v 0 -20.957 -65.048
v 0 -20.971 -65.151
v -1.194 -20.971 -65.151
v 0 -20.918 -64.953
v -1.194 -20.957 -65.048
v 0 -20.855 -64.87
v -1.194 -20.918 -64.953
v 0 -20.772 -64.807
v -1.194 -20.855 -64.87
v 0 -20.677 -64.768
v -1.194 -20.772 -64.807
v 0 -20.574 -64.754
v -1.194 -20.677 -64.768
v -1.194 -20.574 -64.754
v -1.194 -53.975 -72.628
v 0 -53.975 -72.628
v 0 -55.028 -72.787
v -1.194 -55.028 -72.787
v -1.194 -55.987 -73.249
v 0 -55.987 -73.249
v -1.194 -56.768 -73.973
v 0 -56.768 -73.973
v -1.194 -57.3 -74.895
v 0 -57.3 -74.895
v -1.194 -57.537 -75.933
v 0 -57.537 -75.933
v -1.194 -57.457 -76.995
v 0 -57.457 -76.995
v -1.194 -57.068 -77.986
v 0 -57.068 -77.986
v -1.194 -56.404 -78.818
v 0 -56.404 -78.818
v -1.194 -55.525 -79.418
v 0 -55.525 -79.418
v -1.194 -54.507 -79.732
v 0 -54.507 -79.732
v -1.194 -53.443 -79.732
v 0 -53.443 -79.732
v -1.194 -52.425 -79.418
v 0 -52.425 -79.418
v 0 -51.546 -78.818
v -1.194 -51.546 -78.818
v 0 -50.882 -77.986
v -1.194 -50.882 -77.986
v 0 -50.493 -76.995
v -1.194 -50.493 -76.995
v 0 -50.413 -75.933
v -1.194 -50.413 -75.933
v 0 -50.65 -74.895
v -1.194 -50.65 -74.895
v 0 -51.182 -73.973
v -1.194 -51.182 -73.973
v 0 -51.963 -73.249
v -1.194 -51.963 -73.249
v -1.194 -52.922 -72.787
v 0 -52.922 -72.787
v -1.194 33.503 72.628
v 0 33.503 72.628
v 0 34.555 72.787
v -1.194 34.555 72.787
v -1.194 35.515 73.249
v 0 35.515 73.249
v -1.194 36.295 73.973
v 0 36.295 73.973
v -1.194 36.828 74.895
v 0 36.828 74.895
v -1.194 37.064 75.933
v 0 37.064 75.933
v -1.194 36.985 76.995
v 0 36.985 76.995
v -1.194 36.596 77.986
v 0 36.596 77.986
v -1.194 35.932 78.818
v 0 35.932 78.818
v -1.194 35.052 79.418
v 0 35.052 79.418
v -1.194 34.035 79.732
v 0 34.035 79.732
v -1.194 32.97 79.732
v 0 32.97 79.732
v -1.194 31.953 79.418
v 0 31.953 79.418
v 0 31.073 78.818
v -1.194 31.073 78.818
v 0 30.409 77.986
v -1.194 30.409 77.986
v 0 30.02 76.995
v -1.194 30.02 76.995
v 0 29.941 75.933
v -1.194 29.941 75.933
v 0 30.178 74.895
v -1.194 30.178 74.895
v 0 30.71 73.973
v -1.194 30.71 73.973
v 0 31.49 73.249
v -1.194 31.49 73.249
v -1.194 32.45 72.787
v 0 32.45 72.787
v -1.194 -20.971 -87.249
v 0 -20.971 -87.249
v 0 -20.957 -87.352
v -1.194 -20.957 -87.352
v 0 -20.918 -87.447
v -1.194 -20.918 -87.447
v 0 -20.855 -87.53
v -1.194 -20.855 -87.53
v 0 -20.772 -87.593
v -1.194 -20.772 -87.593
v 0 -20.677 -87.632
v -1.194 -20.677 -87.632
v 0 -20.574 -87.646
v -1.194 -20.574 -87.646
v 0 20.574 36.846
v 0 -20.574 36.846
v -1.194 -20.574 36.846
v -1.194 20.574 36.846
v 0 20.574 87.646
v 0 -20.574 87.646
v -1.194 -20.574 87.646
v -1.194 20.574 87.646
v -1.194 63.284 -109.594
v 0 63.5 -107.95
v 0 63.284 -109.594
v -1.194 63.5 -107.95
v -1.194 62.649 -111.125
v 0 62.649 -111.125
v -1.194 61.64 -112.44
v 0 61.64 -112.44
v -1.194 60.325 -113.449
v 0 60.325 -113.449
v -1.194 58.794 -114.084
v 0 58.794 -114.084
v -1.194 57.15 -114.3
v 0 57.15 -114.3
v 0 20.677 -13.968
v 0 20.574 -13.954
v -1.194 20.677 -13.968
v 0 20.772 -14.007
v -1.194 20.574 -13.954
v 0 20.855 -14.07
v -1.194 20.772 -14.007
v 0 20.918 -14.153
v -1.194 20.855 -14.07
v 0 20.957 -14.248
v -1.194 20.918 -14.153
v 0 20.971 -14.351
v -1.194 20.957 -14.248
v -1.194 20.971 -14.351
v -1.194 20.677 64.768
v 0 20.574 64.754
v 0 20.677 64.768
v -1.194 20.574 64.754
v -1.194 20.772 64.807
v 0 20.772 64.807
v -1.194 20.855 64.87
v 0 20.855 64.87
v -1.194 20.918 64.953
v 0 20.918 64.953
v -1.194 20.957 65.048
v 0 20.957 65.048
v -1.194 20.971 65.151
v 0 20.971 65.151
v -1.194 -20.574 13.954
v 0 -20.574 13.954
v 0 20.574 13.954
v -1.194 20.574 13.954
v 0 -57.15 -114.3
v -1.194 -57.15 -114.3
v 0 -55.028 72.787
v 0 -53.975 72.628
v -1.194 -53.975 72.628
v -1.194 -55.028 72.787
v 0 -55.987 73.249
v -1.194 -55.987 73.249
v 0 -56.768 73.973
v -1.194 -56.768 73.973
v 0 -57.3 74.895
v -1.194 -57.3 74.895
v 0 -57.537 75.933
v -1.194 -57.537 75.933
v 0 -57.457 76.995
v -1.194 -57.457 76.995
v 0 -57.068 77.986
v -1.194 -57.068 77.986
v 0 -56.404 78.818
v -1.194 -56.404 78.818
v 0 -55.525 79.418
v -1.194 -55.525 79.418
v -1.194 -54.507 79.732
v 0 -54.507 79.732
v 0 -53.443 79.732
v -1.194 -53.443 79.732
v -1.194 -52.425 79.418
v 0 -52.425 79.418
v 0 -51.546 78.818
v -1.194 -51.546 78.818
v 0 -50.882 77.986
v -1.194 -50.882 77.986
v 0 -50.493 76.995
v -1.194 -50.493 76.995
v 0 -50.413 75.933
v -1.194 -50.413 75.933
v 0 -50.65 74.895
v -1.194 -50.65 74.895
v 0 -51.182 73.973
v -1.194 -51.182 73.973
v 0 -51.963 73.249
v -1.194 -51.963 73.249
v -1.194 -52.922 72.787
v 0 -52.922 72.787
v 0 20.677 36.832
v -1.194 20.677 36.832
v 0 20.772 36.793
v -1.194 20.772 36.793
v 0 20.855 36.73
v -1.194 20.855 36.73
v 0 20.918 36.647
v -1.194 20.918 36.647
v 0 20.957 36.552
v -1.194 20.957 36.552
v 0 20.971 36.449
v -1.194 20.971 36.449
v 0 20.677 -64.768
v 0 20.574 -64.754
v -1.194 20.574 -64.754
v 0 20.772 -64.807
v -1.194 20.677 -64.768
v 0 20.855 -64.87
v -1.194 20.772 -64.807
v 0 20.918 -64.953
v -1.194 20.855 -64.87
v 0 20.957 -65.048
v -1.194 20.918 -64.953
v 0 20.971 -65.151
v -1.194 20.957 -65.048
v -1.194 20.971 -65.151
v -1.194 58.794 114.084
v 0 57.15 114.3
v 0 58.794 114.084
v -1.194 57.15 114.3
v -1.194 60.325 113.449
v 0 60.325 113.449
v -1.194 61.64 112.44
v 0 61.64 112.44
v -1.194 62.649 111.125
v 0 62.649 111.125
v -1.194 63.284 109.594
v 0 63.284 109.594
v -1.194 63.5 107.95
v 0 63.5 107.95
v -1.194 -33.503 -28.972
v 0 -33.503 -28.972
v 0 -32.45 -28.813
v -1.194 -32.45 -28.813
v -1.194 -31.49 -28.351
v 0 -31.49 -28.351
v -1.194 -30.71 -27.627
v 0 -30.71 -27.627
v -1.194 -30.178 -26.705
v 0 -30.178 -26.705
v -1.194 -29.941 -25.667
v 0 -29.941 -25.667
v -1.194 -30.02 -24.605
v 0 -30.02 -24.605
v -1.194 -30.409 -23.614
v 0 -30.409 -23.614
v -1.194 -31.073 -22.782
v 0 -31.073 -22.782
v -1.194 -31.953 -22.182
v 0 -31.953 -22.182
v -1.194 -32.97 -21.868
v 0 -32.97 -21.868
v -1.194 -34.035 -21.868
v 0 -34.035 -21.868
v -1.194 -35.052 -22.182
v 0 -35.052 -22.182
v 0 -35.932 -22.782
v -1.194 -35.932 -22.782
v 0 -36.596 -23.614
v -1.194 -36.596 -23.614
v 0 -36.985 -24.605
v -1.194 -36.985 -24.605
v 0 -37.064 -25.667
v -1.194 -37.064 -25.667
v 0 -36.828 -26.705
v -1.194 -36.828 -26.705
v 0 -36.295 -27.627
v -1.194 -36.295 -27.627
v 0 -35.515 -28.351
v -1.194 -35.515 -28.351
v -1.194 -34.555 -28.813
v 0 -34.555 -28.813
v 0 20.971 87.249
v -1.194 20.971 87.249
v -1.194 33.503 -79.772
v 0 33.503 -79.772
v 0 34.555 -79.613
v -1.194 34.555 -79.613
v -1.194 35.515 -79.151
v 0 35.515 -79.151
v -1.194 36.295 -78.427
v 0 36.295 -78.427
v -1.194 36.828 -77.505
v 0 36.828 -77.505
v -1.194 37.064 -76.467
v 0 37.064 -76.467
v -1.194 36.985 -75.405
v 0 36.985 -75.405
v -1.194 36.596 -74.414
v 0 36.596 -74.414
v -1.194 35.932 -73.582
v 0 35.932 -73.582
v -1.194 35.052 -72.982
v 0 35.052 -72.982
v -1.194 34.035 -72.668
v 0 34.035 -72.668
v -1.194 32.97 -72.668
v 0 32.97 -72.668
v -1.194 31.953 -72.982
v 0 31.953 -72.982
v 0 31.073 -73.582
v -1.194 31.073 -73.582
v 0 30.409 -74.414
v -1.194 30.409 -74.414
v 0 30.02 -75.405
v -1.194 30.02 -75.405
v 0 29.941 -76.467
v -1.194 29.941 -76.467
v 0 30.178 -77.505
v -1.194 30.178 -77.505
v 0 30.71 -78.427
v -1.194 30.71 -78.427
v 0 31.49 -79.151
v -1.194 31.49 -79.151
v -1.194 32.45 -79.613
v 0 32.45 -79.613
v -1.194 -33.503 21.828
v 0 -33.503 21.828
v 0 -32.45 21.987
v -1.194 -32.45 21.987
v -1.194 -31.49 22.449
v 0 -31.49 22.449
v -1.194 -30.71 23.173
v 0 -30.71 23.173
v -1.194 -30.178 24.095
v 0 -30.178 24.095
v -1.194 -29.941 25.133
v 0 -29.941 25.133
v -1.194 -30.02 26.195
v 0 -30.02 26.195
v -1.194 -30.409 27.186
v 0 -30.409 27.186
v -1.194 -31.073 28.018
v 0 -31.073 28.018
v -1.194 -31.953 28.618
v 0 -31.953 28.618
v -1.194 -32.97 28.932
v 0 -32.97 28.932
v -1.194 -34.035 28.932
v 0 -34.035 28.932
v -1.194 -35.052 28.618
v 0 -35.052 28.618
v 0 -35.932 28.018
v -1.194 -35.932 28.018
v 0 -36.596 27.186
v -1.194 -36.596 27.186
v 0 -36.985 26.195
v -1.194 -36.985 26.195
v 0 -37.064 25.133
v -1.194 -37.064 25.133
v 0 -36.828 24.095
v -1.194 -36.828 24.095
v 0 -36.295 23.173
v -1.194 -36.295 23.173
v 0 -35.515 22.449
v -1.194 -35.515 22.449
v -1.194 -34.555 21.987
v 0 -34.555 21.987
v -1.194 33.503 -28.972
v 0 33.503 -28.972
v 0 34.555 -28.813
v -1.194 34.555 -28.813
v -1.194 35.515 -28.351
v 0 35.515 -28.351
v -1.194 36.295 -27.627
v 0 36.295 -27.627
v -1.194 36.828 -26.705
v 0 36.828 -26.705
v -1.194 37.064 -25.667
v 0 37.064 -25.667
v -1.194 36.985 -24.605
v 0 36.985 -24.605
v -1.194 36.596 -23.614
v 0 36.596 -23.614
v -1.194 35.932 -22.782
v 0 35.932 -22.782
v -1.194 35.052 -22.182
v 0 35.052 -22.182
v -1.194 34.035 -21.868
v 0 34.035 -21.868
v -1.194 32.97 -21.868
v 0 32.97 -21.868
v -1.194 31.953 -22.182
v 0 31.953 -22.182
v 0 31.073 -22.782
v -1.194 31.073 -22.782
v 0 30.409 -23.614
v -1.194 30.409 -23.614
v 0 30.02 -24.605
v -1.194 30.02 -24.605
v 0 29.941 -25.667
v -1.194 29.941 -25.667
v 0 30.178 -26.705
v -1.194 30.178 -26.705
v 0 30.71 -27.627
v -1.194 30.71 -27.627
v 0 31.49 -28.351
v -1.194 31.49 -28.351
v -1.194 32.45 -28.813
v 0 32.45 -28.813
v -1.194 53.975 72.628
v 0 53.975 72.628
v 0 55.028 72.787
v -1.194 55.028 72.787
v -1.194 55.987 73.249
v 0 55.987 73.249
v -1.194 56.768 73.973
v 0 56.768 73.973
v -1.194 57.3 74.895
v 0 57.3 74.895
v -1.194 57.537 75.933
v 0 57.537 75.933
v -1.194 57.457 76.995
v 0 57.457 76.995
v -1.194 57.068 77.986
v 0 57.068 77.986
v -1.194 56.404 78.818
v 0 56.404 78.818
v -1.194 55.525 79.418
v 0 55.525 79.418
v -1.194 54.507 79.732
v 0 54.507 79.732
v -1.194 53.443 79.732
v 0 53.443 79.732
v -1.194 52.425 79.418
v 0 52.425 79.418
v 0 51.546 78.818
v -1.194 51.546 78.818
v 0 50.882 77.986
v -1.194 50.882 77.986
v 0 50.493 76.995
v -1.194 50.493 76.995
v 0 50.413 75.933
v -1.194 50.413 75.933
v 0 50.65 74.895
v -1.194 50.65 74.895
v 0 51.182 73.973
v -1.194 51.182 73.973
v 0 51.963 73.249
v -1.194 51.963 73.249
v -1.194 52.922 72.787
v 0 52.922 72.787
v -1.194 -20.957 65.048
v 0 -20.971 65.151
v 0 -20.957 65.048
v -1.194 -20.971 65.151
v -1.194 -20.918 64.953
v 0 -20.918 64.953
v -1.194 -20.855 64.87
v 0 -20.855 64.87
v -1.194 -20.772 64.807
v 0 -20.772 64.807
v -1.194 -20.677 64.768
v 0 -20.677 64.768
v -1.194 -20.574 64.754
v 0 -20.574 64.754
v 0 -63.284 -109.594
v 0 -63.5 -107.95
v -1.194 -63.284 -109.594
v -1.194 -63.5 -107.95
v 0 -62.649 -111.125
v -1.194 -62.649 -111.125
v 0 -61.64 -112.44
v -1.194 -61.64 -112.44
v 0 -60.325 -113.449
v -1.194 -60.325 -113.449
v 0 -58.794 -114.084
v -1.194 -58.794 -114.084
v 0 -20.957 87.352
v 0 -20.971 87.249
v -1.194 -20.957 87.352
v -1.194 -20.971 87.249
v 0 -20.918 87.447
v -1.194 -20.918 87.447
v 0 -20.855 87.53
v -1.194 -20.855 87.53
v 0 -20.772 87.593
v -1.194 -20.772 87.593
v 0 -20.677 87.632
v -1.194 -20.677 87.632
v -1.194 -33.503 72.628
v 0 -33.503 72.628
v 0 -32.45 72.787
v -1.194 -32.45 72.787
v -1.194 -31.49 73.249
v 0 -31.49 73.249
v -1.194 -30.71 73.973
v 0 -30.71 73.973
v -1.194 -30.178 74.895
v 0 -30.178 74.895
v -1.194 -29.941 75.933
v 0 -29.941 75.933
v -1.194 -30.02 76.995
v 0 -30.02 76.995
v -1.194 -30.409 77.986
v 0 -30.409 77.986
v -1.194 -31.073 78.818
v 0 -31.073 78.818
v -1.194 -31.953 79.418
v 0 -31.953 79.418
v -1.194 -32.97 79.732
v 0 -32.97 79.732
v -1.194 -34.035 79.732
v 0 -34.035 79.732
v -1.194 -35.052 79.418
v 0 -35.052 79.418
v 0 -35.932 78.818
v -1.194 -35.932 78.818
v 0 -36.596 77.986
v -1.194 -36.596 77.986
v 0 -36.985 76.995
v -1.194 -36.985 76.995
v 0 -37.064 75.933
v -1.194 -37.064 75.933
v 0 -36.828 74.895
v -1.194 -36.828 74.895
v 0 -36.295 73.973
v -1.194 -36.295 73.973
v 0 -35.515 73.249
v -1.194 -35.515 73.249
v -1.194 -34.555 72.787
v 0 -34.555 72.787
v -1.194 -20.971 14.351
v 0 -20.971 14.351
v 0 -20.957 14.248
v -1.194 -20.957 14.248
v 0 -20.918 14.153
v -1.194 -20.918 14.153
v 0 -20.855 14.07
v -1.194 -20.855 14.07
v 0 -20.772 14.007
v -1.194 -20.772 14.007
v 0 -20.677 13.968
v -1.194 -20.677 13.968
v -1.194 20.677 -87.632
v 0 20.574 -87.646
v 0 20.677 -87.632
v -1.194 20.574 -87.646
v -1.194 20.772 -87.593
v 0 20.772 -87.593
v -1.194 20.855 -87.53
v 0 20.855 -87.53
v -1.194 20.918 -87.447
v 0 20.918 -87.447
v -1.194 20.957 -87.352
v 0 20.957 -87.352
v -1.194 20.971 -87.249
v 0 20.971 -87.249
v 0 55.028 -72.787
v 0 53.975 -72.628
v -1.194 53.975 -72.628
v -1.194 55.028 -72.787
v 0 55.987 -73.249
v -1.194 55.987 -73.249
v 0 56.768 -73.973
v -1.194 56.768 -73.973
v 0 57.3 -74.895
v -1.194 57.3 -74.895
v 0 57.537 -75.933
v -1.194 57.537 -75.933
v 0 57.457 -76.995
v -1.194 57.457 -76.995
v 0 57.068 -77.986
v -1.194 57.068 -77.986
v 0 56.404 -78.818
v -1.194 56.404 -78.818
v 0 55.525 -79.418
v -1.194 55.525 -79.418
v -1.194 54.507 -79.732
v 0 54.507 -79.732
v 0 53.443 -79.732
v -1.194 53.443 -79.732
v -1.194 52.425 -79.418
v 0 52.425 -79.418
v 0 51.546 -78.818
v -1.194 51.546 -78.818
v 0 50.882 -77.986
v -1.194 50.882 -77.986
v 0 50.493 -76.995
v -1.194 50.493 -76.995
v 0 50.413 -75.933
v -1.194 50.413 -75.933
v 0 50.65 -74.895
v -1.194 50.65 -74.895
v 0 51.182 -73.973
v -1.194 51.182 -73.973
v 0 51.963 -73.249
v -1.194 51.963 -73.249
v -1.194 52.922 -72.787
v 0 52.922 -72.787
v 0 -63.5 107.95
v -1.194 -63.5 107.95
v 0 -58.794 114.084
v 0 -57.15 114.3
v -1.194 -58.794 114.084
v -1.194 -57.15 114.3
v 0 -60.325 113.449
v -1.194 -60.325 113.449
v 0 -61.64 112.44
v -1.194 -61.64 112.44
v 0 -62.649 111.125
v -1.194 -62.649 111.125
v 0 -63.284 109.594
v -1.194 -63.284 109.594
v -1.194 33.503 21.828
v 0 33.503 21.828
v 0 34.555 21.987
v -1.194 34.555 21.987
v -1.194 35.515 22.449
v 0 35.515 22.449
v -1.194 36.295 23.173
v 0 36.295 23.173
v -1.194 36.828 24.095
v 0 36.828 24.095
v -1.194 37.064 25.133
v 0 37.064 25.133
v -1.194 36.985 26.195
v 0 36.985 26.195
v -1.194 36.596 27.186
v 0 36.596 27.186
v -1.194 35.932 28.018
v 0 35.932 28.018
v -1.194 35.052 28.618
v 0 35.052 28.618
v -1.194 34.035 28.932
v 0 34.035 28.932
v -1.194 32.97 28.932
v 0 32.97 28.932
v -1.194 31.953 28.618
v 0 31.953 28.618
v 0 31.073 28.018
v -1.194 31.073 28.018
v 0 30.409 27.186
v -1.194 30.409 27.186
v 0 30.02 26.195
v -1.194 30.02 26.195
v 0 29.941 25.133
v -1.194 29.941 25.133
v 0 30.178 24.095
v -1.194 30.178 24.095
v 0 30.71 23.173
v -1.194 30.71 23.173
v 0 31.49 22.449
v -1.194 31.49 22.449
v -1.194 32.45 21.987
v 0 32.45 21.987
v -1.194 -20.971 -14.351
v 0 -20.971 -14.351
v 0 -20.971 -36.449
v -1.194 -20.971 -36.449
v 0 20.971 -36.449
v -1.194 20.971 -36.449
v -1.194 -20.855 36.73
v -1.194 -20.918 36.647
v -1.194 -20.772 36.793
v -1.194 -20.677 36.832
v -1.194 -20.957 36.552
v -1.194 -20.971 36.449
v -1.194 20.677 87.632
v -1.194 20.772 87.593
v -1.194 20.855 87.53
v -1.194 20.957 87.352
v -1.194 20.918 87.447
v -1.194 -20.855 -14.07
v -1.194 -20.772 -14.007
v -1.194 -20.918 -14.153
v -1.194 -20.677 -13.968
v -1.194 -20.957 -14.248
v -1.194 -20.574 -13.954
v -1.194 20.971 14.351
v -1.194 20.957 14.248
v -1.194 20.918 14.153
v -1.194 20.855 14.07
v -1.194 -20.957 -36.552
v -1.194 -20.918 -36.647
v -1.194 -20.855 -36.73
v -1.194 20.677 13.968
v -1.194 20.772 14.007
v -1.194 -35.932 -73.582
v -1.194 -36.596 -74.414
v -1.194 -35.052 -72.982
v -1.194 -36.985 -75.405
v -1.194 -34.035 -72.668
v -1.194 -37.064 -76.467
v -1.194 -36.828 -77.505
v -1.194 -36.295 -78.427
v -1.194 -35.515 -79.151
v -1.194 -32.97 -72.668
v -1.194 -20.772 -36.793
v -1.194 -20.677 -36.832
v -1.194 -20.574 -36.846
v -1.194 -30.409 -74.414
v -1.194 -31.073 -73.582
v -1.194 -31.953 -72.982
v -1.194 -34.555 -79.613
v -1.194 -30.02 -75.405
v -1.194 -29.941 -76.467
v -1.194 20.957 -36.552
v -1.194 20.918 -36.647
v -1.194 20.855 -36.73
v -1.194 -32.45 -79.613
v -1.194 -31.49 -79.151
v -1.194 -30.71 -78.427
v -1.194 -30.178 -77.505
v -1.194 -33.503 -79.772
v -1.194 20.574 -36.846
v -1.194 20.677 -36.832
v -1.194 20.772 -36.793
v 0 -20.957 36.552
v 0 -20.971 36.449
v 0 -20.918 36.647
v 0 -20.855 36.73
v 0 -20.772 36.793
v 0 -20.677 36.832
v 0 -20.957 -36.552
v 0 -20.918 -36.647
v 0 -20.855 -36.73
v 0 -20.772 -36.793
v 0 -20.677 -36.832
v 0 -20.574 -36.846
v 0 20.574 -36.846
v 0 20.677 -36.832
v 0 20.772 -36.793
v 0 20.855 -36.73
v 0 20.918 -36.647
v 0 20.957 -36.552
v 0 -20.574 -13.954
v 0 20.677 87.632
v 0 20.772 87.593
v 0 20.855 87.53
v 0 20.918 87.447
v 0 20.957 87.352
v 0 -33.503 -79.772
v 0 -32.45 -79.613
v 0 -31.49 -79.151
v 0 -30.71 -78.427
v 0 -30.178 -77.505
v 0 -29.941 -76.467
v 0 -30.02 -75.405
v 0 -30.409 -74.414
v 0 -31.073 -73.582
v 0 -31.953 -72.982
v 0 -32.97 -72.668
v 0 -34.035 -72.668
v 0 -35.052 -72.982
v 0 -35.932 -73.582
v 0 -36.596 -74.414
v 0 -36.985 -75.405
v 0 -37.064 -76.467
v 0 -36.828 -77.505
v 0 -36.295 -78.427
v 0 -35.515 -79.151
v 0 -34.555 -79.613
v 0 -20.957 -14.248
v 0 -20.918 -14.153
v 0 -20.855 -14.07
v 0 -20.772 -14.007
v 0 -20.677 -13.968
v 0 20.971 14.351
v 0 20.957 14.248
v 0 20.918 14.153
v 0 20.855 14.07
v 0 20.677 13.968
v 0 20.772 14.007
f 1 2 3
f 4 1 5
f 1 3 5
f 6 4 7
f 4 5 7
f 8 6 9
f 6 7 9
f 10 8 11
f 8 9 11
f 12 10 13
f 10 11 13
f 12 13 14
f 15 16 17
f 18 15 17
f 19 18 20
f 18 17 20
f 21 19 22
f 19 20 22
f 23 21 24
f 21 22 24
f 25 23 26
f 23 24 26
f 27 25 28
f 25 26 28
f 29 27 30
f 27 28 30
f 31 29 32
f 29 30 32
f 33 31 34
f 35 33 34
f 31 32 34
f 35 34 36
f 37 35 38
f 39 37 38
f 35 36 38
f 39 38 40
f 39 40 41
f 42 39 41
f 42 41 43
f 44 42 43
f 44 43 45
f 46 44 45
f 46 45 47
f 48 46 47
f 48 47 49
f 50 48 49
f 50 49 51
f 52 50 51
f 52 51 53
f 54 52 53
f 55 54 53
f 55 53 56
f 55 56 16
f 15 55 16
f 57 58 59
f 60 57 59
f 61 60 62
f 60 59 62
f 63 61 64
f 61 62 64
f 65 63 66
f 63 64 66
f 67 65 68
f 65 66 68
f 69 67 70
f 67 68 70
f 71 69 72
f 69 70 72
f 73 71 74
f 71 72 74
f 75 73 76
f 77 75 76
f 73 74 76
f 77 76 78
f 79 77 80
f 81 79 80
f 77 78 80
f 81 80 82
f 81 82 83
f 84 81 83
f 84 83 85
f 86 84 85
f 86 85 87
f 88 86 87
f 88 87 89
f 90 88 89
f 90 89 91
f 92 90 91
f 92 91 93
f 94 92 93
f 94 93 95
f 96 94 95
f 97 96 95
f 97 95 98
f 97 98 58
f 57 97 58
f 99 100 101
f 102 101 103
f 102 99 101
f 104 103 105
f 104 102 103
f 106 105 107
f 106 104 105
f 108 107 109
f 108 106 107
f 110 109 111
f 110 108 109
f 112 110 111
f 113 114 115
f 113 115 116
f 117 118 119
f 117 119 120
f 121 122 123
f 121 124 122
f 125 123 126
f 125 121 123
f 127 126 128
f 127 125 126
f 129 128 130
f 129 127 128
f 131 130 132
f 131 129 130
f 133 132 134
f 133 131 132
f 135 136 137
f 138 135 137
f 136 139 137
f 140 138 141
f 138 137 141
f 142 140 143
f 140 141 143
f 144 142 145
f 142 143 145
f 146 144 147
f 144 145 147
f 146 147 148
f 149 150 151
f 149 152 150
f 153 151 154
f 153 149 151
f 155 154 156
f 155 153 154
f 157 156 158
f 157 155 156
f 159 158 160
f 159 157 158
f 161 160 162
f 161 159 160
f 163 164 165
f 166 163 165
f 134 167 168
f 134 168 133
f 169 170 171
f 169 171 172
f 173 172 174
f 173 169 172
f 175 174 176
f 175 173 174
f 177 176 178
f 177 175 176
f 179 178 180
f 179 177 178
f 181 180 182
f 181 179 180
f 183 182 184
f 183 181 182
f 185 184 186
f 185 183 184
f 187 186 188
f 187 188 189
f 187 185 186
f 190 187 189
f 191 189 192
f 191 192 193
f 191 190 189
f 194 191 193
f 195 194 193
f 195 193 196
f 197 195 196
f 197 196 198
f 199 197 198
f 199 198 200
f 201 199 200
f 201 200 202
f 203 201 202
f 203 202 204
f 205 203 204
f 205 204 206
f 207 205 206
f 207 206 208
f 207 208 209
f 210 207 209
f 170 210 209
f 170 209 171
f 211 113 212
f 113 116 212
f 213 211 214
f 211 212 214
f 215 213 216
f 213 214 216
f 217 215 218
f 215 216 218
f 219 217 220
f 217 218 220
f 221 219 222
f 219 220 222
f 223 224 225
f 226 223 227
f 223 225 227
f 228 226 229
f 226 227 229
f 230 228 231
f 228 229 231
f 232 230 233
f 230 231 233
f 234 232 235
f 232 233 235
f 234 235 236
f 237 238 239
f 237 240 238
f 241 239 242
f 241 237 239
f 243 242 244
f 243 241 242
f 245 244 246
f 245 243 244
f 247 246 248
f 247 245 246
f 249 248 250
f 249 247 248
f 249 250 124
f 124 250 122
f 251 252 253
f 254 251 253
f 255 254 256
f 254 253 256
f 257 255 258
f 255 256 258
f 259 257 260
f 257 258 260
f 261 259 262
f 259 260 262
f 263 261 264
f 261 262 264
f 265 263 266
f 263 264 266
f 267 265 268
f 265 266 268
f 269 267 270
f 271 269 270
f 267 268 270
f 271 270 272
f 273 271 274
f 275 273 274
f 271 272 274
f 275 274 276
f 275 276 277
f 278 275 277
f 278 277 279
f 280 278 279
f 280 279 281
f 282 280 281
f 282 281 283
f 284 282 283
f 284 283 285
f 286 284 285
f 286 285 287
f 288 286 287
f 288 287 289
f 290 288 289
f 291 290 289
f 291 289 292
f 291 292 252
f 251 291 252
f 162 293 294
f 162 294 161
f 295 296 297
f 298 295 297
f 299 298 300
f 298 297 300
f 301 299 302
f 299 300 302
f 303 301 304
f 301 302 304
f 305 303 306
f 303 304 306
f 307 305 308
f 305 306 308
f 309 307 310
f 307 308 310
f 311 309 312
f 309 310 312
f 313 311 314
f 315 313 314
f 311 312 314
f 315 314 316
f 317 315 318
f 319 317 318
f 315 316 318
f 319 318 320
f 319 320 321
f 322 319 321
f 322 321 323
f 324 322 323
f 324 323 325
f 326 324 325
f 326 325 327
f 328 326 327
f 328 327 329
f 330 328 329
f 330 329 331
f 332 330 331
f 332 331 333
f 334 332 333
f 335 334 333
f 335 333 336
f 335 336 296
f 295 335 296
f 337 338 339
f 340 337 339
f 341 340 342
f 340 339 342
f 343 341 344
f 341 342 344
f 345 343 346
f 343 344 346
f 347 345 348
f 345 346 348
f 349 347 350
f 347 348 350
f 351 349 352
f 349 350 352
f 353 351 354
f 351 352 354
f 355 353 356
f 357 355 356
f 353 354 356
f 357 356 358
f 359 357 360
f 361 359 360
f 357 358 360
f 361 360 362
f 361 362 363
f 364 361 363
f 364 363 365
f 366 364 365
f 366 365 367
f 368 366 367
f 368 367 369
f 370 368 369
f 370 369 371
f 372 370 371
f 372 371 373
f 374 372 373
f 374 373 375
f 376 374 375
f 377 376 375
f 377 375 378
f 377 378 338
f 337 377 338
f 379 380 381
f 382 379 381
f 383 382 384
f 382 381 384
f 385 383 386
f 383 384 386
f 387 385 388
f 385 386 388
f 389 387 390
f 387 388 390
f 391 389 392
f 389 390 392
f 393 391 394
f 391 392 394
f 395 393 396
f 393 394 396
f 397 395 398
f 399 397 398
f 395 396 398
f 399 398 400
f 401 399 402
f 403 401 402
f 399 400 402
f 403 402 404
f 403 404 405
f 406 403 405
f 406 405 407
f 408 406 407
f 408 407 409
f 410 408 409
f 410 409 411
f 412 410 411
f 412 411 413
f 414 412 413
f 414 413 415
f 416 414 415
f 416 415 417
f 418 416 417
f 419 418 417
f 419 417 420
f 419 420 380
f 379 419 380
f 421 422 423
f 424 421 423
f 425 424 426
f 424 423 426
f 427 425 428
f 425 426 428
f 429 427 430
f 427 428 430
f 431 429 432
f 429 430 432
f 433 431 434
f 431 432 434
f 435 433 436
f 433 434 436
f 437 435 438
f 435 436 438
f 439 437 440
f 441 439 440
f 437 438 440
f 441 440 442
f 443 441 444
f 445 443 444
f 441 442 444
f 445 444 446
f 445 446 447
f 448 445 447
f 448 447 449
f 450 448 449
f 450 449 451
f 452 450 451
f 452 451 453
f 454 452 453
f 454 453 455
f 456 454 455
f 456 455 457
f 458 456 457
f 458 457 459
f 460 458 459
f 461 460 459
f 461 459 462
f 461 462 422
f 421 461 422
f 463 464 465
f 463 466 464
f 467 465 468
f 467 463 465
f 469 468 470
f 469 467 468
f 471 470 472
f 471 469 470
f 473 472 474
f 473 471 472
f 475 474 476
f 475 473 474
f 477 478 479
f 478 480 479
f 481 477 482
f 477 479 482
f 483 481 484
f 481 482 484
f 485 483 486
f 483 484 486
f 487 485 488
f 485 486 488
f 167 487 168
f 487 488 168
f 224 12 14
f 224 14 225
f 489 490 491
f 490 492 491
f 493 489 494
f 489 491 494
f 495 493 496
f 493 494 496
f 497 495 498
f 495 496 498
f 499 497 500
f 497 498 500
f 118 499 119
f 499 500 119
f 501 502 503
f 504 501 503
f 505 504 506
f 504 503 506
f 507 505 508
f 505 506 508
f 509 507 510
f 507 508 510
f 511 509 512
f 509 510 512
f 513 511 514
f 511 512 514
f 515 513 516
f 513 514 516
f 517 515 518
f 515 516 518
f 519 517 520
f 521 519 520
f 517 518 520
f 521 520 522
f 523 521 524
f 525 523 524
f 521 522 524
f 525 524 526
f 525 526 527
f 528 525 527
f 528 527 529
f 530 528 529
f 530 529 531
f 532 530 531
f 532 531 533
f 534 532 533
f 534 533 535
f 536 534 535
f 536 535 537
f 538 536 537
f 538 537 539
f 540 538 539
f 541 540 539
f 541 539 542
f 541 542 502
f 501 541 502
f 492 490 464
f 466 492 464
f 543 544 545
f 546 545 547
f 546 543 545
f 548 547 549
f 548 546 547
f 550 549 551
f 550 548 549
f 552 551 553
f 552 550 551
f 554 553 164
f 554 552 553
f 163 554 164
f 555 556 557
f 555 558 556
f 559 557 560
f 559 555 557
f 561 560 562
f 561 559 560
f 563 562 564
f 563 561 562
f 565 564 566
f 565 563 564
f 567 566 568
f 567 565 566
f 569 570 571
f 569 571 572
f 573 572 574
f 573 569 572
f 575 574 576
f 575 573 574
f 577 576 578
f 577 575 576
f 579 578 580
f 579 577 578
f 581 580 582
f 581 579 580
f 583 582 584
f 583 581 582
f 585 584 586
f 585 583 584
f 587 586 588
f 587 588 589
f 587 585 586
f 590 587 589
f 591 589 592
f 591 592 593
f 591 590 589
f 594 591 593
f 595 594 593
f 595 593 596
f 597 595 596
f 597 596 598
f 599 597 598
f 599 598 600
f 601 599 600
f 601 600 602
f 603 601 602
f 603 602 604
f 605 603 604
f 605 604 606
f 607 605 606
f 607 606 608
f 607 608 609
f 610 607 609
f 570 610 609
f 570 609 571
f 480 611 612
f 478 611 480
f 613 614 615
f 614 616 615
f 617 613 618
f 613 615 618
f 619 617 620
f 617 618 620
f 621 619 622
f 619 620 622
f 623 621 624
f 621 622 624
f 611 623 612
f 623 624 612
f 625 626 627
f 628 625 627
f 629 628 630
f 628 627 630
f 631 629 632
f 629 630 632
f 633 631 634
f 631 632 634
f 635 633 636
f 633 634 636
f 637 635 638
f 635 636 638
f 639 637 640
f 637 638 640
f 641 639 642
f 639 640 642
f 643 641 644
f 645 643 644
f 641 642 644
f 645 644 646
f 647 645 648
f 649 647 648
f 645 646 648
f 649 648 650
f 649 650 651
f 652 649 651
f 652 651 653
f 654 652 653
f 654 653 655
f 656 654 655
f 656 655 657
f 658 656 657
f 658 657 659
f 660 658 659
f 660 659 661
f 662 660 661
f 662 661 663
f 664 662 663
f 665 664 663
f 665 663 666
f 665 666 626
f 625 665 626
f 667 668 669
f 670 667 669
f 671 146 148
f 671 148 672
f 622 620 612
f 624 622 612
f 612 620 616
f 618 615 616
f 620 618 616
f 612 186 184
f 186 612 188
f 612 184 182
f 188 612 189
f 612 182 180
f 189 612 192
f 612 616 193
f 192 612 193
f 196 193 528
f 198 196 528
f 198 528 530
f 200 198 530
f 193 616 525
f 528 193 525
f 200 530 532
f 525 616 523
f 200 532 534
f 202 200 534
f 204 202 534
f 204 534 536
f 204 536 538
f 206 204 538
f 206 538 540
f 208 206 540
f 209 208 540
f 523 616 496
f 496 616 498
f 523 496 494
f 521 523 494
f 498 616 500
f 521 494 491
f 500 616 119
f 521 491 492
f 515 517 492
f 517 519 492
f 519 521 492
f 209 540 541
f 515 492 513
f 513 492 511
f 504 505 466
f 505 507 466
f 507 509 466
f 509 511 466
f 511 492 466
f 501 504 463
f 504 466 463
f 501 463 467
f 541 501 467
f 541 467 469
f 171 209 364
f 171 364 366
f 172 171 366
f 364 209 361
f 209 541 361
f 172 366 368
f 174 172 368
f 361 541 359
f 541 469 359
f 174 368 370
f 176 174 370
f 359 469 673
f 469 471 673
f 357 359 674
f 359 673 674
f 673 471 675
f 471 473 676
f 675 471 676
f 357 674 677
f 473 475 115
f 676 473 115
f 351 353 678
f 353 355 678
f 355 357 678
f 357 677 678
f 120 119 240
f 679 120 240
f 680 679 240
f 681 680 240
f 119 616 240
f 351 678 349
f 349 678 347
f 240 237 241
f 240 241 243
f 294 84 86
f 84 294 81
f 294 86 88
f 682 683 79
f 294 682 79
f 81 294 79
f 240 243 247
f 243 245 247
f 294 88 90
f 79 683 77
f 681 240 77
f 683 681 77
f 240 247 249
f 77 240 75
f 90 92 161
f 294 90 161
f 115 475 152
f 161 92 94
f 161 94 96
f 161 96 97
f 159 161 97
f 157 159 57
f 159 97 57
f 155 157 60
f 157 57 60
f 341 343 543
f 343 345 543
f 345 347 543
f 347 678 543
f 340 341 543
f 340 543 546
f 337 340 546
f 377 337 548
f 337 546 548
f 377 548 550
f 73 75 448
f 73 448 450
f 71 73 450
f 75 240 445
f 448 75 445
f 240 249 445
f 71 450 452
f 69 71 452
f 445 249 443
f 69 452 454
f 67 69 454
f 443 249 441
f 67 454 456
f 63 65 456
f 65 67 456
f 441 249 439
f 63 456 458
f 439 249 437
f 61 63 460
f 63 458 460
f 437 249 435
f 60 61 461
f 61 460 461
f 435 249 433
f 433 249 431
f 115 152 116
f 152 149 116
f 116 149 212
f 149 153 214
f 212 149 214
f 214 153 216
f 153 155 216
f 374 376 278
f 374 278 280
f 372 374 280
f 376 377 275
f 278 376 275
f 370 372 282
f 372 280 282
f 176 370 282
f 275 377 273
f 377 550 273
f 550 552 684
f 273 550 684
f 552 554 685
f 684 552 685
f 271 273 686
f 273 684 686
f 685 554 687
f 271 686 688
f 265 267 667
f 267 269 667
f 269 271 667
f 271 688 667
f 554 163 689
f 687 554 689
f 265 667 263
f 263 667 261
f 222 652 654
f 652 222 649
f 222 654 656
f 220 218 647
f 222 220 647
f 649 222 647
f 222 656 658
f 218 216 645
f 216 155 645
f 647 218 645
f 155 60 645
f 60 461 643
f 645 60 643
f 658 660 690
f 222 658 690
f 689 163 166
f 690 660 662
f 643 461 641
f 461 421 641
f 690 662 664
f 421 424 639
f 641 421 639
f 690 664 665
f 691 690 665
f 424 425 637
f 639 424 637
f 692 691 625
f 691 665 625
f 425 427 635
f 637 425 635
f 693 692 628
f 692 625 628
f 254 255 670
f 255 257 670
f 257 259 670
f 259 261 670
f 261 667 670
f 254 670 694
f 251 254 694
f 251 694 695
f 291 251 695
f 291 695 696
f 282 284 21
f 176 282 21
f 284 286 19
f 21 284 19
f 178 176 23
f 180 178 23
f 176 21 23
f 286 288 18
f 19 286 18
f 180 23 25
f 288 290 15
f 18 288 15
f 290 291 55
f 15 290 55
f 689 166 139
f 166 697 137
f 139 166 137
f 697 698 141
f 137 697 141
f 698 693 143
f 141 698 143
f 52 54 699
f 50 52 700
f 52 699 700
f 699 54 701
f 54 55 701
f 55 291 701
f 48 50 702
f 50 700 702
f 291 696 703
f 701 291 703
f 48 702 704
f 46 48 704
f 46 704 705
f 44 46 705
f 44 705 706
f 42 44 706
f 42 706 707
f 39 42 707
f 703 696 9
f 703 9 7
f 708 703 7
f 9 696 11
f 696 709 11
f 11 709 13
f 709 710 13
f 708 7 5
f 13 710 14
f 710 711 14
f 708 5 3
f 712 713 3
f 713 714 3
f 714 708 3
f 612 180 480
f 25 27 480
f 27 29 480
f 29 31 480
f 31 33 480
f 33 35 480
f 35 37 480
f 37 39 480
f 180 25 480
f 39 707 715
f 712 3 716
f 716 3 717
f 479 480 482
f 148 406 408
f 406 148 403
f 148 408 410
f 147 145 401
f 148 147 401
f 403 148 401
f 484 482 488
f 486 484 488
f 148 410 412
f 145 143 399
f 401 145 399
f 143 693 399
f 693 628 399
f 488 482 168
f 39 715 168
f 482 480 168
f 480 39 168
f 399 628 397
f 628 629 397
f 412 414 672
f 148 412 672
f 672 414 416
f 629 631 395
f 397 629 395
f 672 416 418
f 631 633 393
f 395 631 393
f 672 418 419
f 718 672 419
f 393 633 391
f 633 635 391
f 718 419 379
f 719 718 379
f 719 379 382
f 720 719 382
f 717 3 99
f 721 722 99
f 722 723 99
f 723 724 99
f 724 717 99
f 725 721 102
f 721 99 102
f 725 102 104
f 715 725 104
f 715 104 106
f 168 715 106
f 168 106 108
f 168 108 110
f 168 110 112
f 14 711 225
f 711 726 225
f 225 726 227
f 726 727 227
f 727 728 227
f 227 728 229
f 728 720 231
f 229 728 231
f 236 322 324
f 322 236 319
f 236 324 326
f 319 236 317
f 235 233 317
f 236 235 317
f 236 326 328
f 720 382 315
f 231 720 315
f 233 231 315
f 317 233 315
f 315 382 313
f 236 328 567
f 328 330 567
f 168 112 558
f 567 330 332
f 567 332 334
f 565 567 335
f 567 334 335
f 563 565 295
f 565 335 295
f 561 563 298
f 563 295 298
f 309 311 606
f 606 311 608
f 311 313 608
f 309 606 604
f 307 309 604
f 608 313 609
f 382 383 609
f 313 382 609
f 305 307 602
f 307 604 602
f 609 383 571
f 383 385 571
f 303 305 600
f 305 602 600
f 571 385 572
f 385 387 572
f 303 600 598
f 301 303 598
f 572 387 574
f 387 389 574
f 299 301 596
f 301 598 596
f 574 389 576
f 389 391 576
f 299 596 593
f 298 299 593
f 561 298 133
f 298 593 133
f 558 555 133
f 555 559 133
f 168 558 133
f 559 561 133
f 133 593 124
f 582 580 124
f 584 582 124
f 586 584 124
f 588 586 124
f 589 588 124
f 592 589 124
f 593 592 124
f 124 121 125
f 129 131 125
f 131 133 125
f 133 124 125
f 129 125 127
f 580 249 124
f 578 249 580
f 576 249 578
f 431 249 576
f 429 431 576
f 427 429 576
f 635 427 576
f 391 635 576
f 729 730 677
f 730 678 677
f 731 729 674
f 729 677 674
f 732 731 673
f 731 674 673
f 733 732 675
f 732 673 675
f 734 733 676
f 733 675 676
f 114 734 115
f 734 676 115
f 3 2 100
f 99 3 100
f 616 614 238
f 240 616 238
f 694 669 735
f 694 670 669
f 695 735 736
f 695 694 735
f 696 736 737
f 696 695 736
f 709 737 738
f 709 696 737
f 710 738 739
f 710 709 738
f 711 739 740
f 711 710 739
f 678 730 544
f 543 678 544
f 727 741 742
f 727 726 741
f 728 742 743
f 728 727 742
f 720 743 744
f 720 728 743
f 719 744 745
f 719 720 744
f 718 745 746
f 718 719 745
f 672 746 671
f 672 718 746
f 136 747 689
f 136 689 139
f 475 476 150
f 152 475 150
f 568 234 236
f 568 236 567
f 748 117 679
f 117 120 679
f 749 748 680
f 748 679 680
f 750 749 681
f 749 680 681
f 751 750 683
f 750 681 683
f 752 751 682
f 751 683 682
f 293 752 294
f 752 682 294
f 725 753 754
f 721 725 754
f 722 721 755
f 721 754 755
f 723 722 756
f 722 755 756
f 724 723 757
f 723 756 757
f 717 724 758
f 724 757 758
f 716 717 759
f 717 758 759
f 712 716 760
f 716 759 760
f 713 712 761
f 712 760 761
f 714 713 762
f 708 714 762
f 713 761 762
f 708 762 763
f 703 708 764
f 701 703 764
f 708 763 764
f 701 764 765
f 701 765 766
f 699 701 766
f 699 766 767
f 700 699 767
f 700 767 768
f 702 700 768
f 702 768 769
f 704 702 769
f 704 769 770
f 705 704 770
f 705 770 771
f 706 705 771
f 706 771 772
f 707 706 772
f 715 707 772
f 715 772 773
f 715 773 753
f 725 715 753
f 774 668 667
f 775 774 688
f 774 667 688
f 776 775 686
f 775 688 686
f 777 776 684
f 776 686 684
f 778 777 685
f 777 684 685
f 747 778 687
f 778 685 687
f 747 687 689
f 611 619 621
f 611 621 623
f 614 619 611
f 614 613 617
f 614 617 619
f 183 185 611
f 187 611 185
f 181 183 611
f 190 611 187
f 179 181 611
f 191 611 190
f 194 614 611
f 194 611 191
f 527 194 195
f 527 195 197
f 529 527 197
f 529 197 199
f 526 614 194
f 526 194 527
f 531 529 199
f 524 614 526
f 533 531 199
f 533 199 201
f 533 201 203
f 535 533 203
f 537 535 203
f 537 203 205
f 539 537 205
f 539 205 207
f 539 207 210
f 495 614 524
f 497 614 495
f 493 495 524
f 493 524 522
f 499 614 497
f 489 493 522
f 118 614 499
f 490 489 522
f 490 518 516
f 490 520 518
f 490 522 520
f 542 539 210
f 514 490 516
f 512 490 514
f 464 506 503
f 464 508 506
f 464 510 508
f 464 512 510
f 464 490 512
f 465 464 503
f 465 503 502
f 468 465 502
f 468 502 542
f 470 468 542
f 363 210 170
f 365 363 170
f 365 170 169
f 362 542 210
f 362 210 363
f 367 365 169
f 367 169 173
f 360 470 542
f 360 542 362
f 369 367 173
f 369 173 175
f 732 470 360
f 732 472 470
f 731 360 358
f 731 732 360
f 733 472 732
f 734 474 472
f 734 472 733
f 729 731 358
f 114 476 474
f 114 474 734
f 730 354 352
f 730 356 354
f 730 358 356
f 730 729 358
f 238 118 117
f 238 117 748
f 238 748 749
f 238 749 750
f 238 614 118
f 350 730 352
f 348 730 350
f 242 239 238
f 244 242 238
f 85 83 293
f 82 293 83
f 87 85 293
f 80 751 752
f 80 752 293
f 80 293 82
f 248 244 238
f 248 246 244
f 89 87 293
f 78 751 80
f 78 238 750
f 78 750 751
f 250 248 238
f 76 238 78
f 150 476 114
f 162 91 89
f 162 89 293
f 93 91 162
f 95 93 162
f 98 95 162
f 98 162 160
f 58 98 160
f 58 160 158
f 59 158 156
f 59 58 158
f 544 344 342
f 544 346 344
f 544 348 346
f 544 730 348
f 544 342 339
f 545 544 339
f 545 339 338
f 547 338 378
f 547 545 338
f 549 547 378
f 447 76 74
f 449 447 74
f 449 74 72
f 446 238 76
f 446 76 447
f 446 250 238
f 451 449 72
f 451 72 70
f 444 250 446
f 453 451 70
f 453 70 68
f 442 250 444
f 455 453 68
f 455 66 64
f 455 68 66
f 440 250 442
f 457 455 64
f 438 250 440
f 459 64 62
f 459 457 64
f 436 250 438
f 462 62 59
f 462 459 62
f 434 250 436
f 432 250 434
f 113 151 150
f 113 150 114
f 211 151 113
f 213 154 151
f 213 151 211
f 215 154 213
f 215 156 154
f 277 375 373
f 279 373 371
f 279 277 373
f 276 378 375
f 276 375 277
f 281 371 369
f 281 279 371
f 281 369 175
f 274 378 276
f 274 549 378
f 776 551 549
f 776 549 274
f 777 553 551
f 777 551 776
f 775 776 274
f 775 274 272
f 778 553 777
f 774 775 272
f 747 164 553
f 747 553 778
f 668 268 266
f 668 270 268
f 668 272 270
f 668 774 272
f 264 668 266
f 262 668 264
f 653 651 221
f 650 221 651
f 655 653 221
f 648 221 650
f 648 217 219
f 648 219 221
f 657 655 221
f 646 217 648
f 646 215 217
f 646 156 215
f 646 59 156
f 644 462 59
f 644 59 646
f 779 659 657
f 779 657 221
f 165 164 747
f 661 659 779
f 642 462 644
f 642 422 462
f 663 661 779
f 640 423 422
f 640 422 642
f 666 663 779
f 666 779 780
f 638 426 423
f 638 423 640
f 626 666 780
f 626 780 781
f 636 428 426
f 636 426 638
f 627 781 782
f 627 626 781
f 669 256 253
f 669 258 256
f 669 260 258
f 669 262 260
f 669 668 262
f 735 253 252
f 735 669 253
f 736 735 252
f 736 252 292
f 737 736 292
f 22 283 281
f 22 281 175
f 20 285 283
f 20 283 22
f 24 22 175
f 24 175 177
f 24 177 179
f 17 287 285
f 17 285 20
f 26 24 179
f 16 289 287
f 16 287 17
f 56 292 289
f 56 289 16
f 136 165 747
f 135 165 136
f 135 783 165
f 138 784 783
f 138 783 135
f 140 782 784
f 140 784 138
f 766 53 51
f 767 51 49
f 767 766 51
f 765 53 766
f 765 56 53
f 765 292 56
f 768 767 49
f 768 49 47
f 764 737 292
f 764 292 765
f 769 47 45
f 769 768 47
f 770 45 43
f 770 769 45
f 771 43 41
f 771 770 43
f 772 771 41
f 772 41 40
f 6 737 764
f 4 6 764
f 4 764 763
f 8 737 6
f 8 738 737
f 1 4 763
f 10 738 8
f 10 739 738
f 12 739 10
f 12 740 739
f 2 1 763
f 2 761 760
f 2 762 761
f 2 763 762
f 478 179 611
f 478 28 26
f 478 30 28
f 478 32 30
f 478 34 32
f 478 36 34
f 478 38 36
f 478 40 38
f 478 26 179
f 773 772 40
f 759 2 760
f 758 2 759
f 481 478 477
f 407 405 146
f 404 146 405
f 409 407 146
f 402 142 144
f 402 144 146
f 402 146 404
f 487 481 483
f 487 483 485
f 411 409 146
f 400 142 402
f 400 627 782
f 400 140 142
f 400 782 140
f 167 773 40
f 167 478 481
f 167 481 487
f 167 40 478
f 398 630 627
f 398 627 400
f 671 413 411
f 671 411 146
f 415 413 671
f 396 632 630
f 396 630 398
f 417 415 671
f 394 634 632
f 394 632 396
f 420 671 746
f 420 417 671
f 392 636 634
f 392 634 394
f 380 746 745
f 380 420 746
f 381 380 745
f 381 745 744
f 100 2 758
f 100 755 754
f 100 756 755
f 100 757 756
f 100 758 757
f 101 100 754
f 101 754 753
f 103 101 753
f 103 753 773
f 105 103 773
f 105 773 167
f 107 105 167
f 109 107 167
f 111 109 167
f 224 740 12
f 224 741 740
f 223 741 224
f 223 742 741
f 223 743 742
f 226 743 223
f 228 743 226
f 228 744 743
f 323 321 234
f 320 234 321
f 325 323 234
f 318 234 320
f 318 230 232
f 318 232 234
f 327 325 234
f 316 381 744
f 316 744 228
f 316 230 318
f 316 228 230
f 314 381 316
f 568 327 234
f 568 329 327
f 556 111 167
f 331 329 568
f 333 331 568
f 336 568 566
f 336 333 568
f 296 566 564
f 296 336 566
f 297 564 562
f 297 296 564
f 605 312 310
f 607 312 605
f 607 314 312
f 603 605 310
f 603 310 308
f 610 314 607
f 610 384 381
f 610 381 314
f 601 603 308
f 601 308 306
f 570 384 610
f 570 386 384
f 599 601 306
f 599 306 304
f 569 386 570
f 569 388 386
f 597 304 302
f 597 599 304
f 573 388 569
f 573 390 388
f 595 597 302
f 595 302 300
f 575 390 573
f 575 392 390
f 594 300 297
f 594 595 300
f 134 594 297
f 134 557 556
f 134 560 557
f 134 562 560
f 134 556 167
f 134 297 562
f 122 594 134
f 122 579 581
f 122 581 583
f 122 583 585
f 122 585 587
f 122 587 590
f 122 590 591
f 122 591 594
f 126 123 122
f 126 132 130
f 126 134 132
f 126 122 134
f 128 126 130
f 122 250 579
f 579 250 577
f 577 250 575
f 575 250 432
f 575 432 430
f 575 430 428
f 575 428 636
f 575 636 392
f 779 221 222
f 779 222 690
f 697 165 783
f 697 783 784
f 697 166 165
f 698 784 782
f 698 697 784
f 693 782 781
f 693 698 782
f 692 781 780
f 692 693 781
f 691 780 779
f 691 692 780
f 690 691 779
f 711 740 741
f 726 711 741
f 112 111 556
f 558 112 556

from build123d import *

# Parameters (mm, degrees)
SKETCH1_W               = 228.6
SKETCH1_H               = 127
BASE_FLANGE1_DEPTH      = 1.1938
CUT_EXTRUDE1_REACH      = 132.76
SKETCH6_R               = 3.571875
SKETCH6_W               = 22.89175
SKETCH6_H               = 41.94175
LPATTERN1_COUNT         = 4
LPATTERN1_PITCH         = 50.8
CUT_EXTRUDE2_REACH      = 132.76
SKETCH7_R               = 3.571875
MIRROR2_COPY_1_REACH    = 132.76
MIRROR2_COPY_1_SKETCH_R = 3.571875
FILLET1_R               = 6.35
FILLET2_R               = 0.396875


# Sheet-metal steps are written as plain solids
with BuildPart() as part:
    # Sketch1 → Base-Flange1 (new body)
    with BuildSketch(Plane(origin=(0, 0, 0), x_dir=(0, 0, -1), z_dir=(1, 0, 0))):
        Rectangle(SKETCH1_W, SKETCH1_H)
    extrude(amount=-BASE_FLANGE1_DEPTH)

    # Sketch6 → Cut-Extrude1 (cut, up to next)
    with BuildSketch(Plane(origin=(0, 0, 0), x_dir=(0, 0, -1), z_dir=(1, 0, 0)), mode=Mode.PRIVATE) as cut_extrude1_sk1:
        with Locations((-76.2, 33.5026)):
            Circle(SKETCH6_R)
    cut_extrude1_tool1 = extrude(cut_extrude1_sk1.sketch, amount=-CUT_EXTRUDE1_REACH, mode=Mode.PRIVATE) & part.part
    # Sketch6 → Cut-Extrude1 (cut, up to next)
    with BuildSketch(Plane(origin=(0, 0, 0), x_dir=(0, 0, -1), z_dir=(1, 0, 0)), mode=Mode.PRIVATE) as cut_extrude1_sk2:
        with Locations((-76.2, -33.5026)):
            Circle(SKETCH6_R)
    cut_extrude1_tool2 = extrude(cut_extrude1_sk2.sketch, amount=-CUT_EXTRUDE1_REACH, mode=Mode.PRIVATE) & part.part
    # Sketch6 → Cut-Extrude1 (cut, up to next)
    with BuildSketch(Plane(origin=(0, 0, 0), x_dir=(0, 0, -1), z_dir=(1, 0, 0)), mode=Mode.PRIVATE) as cut_extrude1_sk3:
        with Locations((-76.2, 0)):
            Rectangle(SKETCH6_W, SKETCH6_H)
    cut_extrude1_tool3 = extrude(cut_extrude1_sk3.sketch, amount=-CUT_EXTRUDE1_REACH, mode=Mode.PRIVATE) & part.part
    cut_extrude1_1 = cut_extrude1_tool1.solids().sort_by_distance((0, 33.5026, 76.2))[0]
    add(cut_extrude1_1, mode=Mode.SUBTRACT)
    cut_extrude1_2 = cut_extrude1_tool2.solids().sort_by_distance((0, -33.5026, 76.2))[0]
    add(cut_extrude1_2, mode=Mode.SUBTRACT)
    cut_extrude1_3 = cut_extrude1_tool3.solids().sort_by_distance((0, 0, 76.2))[0]
    add(cut_extrude1_3, mode=Mode.SUBTRACT)
    cut_extrude1 = cut_extrude1_1 + cut_extrude1_2 + cut_extrude1_3  # Cut-Extrude1 as one shape, for the pattern or mirror that repeats it

    # LPattern1: Cut-Extrude1 ×4
    with Locations(*[(0, 0, -i * LPATTERN1_PITCH) for i in range(1, LPATTERN1_COUNT)]):
        add(cut_extrude1, mode=Mode.SUBTRACT)

    # Sketch7 → Cut-Extrude2 (cut, up to next)
    with BuildSketch(Plane(origin=(0, 0, 0), x_dir=(0, 0, -1), z_dir=(1, 0, 0)), mode=Mode.PRIVATE) as cut_extrude2_sk1:
        with Locations((-76.2, 53.975)):
            Circle(SKETCH7_R)
    cut_extrude2_tool1 = extrude(cut_extrude2_sk1.sketch, amount=-CUT_EXTRUDE2_REACH, mode=Mode.PRIVATE) & part.part
    cut_extrude2 = cut_extrude2_tool1.solids().sort_by_distance((0, 53.975, 76.2))[0]
    add(cut_extrude2, mode=Mode.SUBTRACT)

    # Mirror1: Cut-Extrude2 across plane
    add(cut_extrude2.mirror(Plane.XY), mode=Mode.SUBTRACT)

    # Mirror2: Cut-Extrude2 across plane
    add(cut_extrude2.mirror(Plane.ZX), mode=Mode.SUBTRACT)

    # Mirror2 copy 1 sketch → Mirror2 copy 1 (cut, up to next)
    with BuildSketch(Plane(origin=(0, 0, 0), x_dir=(0, 0, 1), z_dir=(1, 0, 0)), mode=Mode.PRIVATE) as mirror2_copy_1_sk1:
        with Locations((-76.2, 53.975)):
            Circle(MIRROR2_COPY_1_SKETCH_R)
    mirror2_copy_1_tool1 = extrude(mirror2_copy_1_sk1.sketch, amount=-MIRROR2_COPY_1_REACH, mode=Mode.PRIVATE) & part.part
    add(mirror2_copy_1_tool1.solids().sort_by_distance((0, -53.975, -76.2))[0], mode=Mode.SUBTRACT)

    # Fillet1
    fillet1_edges = [part.edges().sort_by_distance(p)[0] for p in [
        (-0.5969, 63.5, 114.3),
        (-0.5969, 63.5, -114.3),
        (-0.5969, -63.5, -114.3),
        (-0.5969, -63.5, 114.3),
    ]]
    fillet(fillet1_edges, radius=FILLET1_R)

    # Fillet2
    fillet2_edges = [part.edges().sort_by_distance(p)[0] for p in [
        (-0.5969, 20.970875, 64.754125),
        (-0.5969, -20.970875, 64.754125),
        (-0.5969, -20.970875, 87.645875),
        (-0.5969, 20.970875, 87.645875),
        (-0.5969, 20.970875, 13.954125),
        (-0.5969, -20.970875, 13.954125),
        (-0.5969, -20.970875, 36.845875),
        (-0.5969, 20.970875, 36.845875),
        (-0.5969, -20.970875, -36.845875),
        (-0.5969, 20.970875, -36.845875),
        (-0.5969, -20.970875, -13.954125),
        (-0.5969, 20.970875, -13.954125),
        (-0.5969, -20.970875, -87.645875),
        (-0.5969, 20.970875, -87.645875),
        (-0.5969, -20.970875, -64.754125),
        (-0.5969, 20.970875, -64.754125),
    ]]
    fillet(fillet2_edges, radius=FILLET2_R)


solid = part.part
